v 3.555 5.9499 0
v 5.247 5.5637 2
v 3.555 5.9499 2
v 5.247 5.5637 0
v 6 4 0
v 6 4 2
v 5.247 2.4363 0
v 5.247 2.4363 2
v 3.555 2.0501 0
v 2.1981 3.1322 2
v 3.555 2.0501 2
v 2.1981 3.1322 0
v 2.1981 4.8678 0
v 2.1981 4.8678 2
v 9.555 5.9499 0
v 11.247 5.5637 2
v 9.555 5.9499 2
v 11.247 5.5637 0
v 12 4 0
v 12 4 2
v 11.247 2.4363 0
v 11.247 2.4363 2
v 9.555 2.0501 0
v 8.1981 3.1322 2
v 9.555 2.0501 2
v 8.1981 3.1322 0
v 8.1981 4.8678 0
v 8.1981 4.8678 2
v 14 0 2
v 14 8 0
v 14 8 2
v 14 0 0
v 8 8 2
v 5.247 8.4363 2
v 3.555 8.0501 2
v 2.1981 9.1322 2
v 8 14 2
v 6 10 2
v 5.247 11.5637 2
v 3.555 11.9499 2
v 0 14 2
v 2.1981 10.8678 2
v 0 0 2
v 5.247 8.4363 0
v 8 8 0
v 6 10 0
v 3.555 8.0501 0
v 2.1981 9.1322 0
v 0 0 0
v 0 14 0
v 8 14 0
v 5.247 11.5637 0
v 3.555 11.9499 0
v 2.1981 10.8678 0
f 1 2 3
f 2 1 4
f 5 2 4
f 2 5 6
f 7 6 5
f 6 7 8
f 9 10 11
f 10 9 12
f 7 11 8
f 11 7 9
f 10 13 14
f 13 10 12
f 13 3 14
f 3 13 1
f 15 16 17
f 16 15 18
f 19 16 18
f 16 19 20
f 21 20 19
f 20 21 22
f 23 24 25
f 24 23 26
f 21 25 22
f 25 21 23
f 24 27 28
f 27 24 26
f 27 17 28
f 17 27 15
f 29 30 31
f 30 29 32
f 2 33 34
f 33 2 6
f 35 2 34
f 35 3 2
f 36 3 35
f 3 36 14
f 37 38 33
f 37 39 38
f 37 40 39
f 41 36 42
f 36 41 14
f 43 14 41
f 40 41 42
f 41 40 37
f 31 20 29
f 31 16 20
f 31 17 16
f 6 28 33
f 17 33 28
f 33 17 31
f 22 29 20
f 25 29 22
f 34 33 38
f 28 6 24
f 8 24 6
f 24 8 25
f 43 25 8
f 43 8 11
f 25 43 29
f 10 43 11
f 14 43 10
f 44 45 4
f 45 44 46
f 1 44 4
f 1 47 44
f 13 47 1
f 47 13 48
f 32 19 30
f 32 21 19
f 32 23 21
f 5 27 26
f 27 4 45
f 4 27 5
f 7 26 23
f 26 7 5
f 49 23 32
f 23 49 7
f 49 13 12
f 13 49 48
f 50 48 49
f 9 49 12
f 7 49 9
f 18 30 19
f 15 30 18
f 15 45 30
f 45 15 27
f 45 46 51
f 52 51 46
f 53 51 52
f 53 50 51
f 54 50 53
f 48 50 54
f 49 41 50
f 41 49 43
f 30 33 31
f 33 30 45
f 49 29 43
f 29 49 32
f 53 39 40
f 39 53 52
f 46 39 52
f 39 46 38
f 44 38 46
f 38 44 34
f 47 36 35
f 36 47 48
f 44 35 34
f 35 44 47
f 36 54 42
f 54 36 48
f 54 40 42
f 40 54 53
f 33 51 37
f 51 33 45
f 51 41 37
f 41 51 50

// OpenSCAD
// configuration
width = 2;       // in holes
height = 2;      // in holes
thickness = 2;   // in mm
hole = 4;        // hole diameter in mm
pad = 2;         // in mm

// internal data
w = 2 * pad + hole;
xl = pad + (pad + hole) * width;
yl = pad + (pad + hole) * height;

difference() {
    cube([xl, w, thickness]);
    for(i=[0:width-1]) {
        translate([
            pad + hole / 2 + (pad + hole) * i ,
            pad + hole / 2,
            -thickness
        ]) {
            cylinder(r = hole / 2, h = 3 * thickness);
        };
    };
};
difference() {
    cube([w, yl, thickness]);
    for(i=[0:height-1]) {
        translate([
            pad + hole / 2,
            pad + hole / 2 + (pad + hole) * i ,
            -thickness
        ]) {
            cylinder(r = hole / 2, h = 3 * thickness);
        };
    };
};
